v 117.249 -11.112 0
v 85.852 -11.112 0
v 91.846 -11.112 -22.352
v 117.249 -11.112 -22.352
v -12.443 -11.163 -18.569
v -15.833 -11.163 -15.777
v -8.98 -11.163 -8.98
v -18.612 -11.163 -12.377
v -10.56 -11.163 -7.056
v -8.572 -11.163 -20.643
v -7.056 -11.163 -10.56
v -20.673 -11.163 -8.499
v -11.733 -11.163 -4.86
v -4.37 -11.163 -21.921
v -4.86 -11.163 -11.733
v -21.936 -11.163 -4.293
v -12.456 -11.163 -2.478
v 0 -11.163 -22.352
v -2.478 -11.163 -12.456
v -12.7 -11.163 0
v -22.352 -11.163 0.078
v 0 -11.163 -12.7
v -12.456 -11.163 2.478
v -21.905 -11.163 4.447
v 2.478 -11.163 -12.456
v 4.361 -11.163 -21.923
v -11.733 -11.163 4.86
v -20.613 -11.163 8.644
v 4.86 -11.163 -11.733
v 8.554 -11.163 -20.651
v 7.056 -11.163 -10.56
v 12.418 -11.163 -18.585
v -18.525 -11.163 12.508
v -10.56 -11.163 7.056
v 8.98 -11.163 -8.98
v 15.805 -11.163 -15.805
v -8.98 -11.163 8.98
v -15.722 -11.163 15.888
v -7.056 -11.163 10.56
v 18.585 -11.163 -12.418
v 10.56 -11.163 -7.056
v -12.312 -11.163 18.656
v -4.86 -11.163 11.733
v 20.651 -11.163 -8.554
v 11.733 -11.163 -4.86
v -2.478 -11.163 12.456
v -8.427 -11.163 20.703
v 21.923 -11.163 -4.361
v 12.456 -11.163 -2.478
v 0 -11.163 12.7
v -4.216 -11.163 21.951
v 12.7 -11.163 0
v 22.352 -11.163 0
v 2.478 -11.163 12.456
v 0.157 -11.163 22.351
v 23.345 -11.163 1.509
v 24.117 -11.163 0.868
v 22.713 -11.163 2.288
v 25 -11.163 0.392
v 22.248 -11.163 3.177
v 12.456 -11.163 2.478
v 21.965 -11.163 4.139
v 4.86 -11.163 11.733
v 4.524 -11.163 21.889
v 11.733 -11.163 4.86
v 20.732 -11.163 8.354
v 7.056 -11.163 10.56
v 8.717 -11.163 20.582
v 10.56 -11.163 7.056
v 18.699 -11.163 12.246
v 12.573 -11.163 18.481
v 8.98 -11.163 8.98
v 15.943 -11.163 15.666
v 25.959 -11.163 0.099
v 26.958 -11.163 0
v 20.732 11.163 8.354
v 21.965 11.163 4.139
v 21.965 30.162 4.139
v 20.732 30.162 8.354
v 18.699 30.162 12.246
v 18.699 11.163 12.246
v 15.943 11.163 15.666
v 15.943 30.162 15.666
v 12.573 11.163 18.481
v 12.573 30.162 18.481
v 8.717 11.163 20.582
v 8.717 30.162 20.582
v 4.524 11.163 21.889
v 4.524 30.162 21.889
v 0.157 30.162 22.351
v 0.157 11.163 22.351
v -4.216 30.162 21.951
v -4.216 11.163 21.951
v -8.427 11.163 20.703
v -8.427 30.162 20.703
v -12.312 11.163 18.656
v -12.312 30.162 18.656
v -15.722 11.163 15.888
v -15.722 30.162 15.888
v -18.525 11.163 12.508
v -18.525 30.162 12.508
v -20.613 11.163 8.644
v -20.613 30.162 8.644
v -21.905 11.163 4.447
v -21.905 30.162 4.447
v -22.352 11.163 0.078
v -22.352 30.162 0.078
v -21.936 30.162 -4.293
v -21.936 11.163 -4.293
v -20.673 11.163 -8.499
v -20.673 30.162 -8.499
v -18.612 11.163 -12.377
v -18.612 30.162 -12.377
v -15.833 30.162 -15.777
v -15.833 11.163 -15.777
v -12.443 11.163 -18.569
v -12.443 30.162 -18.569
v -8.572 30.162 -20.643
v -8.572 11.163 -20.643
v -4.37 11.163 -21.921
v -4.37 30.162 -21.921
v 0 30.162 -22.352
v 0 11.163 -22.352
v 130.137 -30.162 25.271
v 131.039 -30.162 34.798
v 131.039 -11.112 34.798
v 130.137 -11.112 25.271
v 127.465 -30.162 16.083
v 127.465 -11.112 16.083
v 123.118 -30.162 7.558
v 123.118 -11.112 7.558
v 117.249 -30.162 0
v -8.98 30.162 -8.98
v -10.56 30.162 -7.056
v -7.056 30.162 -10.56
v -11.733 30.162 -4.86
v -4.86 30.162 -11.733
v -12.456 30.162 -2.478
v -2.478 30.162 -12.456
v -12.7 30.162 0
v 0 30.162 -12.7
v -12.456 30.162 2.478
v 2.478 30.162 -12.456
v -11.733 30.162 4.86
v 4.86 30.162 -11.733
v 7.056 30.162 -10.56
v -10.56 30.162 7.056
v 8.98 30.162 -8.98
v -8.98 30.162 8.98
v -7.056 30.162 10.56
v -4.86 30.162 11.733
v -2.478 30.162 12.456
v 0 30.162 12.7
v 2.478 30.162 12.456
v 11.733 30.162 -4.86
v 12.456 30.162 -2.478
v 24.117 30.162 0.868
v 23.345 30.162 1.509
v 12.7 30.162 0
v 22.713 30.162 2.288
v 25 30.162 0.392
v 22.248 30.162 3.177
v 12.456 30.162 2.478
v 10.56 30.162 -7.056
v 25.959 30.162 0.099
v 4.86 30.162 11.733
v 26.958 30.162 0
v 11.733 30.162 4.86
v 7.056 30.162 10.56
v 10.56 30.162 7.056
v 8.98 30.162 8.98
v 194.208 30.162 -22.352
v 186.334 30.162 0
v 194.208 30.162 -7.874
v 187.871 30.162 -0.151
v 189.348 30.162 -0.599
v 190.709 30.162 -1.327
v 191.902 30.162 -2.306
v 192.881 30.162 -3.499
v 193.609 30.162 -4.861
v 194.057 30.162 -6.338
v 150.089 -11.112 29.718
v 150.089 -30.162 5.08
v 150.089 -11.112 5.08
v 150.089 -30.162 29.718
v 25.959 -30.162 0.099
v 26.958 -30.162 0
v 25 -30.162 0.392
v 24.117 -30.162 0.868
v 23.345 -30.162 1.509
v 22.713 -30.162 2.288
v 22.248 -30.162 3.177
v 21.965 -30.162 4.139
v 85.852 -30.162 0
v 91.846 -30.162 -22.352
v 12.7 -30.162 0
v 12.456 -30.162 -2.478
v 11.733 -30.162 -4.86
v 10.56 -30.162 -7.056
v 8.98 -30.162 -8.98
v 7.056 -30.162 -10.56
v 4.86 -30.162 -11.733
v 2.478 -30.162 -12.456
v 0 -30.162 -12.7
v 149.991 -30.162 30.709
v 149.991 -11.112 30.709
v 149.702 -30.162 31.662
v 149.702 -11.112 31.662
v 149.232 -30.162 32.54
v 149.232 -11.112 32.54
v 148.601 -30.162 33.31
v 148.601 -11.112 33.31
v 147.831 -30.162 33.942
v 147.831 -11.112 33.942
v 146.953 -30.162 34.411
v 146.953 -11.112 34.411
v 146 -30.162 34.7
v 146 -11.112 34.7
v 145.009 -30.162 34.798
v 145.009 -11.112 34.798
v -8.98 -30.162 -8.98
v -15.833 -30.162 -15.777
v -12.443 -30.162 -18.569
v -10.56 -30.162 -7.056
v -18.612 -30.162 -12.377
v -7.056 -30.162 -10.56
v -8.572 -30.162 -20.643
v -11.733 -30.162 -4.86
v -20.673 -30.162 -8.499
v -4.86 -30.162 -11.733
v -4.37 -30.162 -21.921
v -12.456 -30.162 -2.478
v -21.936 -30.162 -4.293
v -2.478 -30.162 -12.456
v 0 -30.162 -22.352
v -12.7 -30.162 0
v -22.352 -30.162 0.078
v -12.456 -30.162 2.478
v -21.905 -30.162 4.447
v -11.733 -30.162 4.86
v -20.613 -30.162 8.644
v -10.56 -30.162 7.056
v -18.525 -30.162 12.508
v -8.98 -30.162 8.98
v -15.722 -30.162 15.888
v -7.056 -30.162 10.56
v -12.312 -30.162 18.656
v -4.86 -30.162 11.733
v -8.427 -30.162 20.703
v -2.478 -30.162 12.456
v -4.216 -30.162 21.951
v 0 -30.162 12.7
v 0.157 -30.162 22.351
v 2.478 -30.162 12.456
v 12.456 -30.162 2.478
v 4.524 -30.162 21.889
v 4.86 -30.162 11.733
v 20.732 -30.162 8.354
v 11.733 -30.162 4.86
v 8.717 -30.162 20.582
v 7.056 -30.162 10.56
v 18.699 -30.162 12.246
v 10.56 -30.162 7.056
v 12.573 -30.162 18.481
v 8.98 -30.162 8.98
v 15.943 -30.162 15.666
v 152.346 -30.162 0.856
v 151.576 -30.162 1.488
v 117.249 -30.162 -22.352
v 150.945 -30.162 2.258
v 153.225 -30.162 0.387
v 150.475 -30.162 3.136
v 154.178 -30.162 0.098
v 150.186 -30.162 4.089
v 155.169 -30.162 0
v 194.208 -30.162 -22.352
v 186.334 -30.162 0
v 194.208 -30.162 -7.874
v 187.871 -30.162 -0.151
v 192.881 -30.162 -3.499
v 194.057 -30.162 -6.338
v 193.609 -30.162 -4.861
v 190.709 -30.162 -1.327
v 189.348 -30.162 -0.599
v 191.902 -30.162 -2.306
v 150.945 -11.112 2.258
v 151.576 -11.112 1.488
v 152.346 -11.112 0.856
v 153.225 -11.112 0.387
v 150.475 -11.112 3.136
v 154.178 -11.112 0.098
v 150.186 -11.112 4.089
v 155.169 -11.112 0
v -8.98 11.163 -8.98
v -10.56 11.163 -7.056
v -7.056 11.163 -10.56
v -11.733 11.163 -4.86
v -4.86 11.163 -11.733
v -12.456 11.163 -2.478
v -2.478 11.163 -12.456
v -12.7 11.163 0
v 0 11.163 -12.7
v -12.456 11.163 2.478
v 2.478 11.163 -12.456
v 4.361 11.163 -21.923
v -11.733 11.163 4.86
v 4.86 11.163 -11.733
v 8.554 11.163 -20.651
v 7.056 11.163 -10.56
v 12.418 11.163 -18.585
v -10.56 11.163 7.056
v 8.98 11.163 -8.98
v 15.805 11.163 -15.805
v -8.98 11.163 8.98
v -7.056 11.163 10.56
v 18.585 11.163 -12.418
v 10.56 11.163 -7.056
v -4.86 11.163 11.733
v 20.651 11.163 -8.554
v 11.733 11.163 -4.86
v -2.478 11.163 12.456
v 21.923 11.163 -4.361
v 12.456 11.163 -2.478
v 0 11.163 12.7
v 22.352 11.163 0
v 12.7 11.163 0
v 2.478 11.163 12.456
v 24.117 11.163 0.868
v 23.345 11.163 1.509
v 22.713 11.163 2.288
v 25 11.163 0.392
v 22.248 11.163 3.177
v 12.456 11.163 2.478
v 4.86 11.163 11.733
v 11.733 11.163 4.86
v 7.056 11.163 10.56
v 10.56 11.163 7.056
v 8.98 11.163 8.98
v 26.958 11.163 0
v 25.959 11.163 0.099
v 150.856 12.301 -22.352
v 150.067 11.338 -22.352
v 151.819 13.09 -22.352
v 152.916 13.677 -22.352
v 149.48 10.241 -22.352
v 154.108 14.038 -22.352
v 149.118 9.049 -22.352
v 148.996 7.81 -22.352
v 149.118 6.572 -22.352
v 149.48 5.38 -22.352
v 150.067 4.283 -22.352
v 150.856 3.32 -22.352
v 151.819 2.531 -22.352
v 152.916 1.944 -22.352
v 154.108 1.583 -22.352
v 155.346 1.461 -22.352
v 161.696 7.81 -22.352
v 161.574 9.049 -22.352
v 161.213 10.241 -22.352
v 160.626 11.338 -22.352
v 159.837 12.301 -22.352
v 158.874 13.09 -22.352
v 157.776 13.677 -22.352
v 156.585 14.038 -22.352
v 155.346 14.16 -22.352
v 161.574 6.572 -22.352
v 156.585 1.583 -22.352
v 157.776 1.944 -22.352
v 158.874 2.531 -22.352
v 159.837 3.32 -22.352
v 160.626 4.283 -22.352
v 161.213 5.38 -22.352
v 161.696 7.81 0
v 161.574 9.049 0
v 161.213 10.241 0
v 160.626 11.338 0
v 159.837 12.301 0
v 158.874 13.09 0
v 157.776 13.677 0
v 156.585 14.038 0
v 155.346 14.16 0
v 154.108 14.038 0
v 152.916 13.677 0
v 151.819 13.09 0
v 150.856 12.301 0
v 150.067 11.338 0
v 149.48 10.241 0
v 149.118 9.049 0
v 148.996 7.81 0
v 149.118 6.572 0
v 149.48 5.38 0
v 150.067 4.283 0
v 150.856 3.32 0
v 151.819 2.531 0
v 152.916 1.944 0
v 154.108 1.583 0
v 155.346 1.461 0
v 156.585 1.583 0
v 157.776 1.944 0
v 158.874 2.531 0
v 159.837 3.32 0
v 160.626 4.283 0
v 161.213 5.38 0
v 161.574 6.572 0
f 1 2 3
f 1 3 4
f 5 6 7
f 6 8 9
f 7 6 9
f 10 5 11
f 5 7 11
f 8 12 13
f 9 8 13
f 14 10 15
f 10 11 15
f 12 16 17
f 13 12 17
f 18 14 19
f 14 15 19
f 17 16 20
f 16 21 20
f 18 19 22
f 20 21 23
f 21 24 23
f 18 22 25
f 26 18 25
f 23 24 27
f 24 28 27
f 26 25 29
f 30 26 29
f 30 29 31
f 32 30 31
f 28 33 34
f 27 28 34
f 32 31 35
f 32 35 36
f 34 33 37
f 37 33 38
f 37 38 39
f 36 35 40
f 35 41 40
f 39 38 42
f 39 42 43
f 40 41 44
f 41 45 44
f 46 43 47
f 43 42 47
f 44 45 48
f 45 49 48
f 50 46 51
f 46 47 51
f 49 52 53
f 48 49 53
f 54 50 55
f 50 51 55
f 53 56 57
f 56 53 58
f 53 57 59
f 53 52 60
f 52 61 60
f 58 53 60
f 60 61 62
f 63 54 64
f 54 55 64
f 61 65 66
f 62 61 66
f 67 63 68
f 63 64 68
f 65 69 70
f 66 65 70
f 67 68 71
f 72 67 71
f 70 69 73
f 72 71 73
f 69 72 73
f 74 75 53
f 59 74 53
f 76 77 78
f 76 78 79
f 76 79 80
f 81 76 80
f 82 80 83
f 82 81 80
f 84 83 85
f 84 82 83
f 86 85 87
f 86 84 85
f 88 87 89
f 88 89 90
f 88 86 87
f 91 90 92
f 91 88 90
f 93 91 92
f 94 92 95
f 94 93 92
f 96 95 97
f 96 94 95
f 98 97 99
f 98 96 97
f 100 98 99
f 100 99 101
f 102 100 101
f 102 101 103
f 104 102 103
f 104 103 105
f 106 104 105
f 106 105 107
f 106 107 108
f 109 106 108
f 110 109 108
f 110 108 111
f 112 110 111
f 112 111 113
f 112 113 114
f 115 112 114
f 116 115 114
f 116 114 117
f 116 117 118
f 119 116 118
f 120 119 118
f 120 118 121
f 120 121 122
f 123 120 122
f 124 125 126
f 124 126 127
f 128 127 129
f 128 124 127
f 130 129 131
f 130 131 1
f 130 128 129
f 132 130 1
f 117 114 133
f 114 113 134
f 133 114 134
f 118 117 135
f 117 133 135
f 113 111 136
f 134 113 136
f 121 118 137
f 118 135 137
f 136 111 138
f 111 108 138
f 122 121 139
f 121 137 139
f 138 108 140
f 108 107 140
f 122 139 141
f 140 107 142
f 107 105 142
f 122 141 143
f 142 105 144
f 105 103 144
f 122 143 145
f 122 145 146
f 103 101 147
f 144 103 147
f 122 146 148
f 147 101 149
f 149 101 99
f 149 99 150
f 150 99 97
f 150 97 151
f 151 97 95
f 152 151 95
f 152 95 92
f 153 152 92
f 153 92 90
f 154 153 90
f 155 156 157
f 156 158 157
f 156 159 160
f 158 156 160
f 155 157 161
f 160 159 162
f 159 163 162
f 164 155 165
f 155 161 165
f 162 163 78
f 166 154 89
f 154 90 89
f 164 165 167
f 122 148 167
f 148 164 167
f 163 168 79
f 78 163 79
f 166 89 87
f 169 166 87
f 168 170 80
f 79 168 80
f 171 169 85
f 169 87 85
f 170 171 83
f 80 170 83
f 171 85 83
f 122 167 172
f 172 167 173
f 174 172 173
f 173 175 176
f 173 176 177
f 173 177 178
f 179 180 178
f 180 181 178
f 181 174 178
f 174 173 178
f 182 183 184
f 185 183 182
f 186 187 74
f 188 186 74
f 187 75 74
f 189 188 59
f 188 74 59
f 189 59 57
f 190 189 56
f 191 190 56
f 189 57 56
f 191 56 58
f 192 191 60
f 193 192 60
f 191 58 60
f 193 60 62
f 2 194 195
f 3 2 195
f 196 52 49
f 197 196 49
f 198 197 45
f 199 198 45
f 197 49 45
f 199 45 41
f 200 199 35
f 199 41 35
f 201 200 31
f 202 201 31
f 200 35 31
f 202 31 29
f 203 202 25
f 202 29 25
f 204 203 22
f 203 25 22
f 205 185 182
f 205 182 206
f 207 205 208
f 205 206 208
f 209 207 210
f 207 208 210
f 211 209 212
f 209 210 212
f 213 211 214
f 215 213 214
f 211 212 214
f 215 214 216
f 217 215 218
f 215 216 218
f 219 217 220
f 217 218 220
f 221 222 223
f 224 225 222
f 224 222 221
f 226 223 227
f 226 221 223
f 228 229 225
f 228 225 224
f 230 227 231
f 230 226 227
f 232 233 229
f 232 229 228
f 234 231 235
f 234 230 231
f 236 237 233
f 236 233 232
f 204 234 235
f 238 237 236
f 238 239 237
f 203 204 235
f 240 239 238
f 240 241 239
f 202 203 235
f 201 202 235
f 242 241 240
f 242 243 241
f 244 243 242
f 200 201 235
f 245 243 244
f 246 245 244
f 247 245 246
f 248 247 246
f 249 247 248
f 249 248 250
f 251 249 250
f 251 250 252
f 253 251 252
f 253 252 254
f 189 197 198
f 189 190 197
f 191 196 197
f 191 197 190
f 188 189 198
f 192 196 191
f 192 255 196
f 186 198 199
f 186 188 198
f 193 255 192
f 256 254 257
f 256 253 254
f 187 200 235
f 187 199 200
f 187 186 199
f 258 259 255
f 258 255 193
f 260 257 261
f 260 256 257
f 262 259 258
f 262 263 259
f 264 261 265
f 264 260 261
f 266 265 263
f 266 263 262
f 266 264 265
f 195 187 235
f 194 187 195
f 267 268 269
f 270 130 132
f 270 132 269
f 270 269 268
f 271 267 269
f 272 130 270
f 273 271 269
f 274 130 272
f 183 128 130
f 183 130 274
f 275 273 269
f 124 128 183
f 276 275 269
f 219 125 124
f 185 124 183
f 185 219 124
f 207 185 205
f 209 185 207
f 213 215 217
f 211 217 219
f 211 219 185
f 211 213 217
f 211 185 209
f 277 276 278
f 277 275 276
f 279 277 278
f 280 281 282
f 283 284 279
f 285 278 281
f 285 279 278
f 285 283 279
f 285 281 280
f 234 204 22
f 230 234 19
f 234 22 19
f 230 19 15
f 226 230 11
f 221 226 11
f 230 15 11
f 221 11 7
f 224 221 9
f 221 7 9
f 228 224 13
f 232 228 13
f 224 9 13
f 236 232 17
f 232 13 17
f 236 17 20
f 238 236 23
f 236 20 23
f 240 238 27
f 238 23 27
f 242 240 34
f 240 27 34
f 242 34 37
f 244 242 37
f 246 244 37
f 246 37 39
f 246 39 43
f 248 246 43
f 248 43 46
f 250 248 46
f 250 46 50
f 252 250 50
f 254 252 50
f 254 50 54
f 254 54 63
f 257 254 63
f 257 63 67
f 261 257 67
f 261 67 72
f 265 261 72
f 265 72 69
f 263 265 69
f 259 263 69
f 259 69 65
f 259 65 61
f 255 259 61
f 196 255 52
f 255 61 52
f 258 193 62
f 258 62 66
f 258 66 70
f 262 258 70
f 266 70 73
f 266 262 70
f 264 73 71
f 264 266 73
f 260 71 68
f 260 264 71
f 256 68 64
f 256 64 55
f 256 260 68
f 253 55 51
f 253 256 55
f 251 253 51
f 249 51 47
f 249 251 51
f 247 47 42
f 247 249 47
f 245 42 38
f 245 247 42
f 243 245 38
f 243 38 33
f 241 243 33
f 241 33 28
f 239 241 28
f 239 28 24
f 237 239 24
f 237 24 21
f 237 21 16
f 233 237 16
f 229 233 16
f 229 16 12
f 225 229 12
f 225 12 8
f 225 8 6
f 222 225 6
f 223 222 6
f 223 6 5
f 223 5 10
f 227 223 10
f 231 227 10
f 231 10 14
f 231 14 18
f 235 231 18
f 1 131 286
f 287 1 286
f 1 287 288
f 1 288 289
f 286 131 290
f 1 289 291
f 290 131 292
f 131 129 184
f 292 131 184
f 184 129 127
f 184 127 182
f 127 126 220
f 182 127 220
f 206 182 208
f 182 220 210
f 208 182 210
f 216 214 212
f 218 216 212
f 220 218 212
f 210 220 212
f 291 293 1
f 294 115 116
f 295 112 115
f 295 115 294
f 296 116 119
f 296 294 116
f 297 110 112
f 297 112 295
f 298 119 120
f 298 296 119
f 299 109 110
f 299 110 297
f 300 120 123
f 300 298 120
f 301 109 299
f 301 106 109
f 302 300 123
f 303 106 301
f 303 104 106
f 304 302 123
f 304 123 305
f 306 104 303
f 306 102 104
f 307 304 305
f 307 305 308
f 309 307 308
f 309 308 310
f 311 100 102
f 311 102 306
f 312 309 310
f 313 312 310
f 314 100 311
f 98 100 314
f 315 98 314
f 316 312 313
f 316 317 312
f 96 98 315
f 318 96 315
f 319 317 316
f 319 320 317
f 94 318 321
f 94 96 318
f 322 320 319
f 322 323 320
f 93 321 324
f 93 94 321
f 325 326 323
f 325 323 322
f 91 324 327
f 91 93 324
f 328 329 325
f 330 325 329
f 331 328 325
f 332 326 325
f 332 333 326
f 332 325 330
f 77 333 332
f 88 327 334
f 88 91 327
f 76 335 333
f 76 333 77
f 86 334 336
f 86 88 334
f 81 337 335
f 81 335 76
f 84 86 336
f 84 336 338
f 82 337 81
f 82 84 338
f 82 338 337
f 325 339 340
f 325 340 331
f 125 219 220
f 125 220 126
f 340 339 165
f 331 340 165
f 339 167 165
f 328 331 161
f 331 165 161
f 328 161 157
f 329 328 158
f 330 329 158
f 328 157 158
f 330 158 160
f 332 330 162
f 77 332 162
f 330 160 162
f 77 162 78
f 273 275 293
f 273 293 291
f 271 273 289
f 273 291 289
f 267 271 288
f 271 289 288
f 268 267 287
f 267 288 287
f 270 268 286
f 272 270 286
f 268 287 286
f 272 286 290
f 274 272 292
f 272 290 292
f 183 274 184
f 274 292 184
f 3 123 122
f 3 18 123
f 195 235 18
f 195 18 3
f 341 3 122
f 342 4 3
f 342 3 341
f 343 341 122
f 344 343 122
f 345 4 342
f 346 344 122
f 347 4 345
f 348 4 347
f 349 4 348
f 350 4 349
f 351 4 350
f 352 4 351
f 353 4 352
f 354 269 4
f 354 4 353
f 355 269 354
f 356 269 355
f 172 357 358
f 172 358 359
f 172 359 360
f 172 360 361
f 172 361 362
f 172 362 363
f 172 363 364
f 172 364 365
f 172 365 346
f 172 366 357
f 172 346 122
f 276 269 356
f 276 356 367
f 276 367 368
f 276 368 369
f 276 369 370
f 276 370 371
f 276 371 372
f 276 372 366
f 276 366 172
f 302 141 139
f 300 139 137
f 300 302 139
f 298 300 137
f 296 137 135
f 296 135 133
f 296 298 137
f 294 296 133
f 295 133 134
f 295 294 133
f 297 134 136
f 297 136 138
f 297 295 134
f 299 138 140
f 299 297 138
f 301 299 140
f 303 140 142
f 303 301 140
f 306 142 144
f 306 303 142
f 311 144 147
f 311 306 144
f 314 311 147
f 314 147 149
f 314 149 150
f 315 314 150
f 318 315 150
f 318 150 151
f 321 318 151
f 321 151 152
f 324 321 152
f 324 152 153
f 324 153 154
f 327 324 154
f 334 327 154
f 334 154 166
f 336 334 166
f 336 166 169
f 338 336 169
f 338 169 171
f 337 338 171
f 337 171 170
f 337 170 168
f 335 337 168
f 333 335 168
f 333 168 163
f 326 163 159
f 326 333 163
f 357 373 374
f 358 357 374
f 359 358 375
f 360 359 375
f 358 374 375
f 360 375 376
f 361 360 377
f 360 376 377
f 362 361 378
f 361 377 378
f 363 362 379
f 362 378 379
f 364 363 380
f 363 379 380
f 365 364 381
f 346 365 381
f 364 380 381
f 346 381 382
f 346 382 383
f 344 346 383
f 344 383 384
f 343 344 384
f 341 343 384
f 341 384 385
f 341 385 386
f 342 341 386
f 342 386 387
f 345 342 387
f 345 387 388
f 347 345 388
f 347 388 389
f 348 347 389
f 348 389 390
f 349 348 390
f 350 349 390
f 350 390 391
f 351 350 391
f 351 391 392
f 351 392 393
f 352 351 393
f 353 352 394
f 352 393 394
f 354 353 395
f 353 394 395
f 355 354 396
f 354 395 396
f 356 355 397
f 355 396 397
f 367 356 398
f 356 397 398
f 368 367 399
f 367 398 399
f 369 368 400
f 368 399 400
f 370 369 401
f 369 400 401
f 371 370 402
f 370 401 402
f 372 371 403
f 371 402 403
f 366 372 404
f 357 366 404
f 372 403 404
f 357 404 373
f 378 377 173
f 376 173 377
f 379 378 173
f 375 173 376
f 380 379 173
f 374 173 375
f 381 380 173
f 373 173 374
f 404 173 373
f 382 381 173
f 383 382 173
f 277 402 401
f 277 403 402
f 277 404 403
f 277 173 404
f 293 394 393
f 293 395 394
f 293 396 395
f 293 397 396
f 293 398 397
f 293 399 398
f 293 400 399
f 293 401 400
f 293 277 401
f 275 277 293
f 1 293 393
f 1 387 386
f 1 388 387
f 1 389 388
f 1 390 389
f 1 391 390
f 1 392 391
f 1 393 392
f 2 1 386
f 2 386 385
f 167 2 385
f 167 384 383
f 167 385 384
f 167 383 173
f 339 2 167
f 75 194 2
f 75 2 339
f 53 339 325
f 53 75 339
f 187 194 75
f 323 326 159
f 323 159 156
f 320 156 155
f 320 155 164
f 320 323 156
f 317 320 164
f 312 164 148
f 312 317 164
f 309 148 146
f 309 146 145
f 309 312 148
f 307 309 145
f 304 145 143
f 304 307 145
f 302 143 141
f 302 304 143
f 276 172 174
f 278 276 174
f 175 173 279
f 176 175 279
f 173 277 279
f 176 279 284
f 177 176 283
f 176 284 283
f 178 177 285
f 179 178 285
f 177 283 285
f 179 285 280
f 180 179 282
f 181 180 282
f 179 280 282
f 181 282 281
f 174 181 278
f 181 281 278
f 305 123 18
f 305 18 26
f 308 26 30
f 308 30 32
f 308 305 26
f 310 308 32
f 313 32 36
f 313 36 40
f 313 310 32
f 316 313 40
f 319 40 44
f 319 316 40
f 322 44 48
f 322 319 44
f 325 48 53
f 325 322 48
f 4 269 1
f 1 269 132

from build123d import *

# Parameters (mm, degrees)
F1_DEPTH = 30.1625
F2_DEPTH = 11.1633
F4_DEPTH = 19.05
F5_DEPTH = 19.05
F6_R     = 7.874
F7_R     = 5.08
F8_R     = 6.35
F9_DEPTH = 22.353


with BuildPart() as f1:
    # F0 (on Front) → F1 (new body, symmetric)
    with BuildSketch(Plane.XZ):
        Polygon((97.8408, -22.352), (117.2485877871, -22.352), (117.2485877871, 0), (91.8464, 0), align=None)
        Polygon((91.8464, -22.352), (91.8464, 0), (85.852, 0), align=None)
        Polygon((64.8810639977, -22.352), (91.8464, -22.352), (85.852, 0), (43.9732931554, 0), align=None)
        with BuildLine():
            Line((0, -22.352), (64.8810639977, -22.352))
            Line((64.8810639977, -22.352), (43.9732931554, 0))
            Line((43.9732931554, 0), (22.352, 0))
            ThreePointArc((22.352, 0), (15.8052507731, -15.8052507731), (0, -22.352))
        make_face()
        with BuildLine():
            ThreePointArc((22.352, 0), (-15.8052507731, 15.8052507731), (0, -22.352))
            Line((0, -22.352), (0, -12.7))
            ThreePointArc((0, -12.7), (-8.9802561211, 8.9802561211), (12.7, 0))
            Line((12.7, 0), (22.352, 0))
        make_face()
        Polygon((91.8464, -22.352), (97.8408, -22.352), (91.8464, 0), align=None)
        Polygon((194.2084, -22.352), (194.2084, 0), (150.0886, 0), (131.0386, 0), (117.2485877871, 0), (117.2485877871, -22.352), align=None)
        with BuildLine():
            Line((0, -12.7), (0, -22.352))
            ThreePointArc((0, -22.352), (15.8052507731, -15.8052507731), (22.352, 0))
            Line((22.352, 0), (12.7, 0))
            ThreePointArc((12.7, 0), (8.9802561211, -8.9802561211), (0, -12.7))
        make_face()
    extrude(amount=F1_DEPTH, both=True)

    # F0 (on Front) → F2 (cut, symmetric)
    with BuildSketch(Plane.XZ):
        with BuildLine():
            ThreePointArc((22.352, 0), (-15.8052507731, 15.8052507731), (0, -22.352))
            Line((0, -22.352), (0, -12.7))
            ThreePointArc((0, -12.7), (-8.9802561211, 8.9802561211), (12.7, 0))
            Line((12.7, 0), (22.352, 0))
        make_face()
        with BuildLine():
            Line((0, -12.7), (0, -22.352))
            ThreePointArc((0, -22.352), (15.8052507731, -15.8052507731), (22.352, 0))
            Line((22.352, 0), (12.7, 0))
            ThreePointArc((12.7, 0), (8.9802561211, -8.9802561211), (0, -12.7))
        make_face()
    extrude(amount=F2_DEPTH, both=True, mode=Mode.SUBTRACT)

    # F3 (on face) → F4 (cut)
    with BuildSketch(Plane.XZ.offset(30.1625)):
        Polygon((117.2485877871, -22.352), (117.2485877871, 0), (85.852, 0), (91.8464, -22.352), align=None)
    extrude(amount=-F4_DEPTH, mode=Mode.SUBTRACT)

    # F3 (on face) → F5 (join)
    with BuildSketch(Plane.XZ.offset(30.1625)):
        with BuildLine():
            ThreePointArc((131.0386, 34.798), (127.4654323074, 16.0825969798), (117.2485877871, 0))
            Line((117.2485877871, 0), (150.0886, 0))
            Line((150.0886, 0), (150.0886, 34.798))
            Line((150.0886, 34.798), (131.0386, 34.798))
        make_face()
    extrude(amount=-F5_DEPTH)

    # F6
    f6_edges = [f1.edges().sort_by_distance(p)[0] for p in [
        (194.2084, 0, 0),
    ]]
    fillet(f6_edges, radius=F6_R)

    # F7
    f7_edges = [f1.edges().sort_by_distance(p)[0] for p in [
        (150.0886, -20.6375, 34.798),
        (150.0886, -20.6375, 0),
        (22.352, 20.6629, 0),
        (22.352, -20.6629, 0),
    ]]
    fillet(f7_edges, radius=F7_R)

    # F8 (on face) → F9 (cut, through all)
    with BuildSketch(Plane.XY):
        with Locations((155.3464, 7.8105)):
            Circle(F8_R)
    extrude(amount=-F9_DEPTH, mode=Mode.SUBTRACT)


solid = f1.part
